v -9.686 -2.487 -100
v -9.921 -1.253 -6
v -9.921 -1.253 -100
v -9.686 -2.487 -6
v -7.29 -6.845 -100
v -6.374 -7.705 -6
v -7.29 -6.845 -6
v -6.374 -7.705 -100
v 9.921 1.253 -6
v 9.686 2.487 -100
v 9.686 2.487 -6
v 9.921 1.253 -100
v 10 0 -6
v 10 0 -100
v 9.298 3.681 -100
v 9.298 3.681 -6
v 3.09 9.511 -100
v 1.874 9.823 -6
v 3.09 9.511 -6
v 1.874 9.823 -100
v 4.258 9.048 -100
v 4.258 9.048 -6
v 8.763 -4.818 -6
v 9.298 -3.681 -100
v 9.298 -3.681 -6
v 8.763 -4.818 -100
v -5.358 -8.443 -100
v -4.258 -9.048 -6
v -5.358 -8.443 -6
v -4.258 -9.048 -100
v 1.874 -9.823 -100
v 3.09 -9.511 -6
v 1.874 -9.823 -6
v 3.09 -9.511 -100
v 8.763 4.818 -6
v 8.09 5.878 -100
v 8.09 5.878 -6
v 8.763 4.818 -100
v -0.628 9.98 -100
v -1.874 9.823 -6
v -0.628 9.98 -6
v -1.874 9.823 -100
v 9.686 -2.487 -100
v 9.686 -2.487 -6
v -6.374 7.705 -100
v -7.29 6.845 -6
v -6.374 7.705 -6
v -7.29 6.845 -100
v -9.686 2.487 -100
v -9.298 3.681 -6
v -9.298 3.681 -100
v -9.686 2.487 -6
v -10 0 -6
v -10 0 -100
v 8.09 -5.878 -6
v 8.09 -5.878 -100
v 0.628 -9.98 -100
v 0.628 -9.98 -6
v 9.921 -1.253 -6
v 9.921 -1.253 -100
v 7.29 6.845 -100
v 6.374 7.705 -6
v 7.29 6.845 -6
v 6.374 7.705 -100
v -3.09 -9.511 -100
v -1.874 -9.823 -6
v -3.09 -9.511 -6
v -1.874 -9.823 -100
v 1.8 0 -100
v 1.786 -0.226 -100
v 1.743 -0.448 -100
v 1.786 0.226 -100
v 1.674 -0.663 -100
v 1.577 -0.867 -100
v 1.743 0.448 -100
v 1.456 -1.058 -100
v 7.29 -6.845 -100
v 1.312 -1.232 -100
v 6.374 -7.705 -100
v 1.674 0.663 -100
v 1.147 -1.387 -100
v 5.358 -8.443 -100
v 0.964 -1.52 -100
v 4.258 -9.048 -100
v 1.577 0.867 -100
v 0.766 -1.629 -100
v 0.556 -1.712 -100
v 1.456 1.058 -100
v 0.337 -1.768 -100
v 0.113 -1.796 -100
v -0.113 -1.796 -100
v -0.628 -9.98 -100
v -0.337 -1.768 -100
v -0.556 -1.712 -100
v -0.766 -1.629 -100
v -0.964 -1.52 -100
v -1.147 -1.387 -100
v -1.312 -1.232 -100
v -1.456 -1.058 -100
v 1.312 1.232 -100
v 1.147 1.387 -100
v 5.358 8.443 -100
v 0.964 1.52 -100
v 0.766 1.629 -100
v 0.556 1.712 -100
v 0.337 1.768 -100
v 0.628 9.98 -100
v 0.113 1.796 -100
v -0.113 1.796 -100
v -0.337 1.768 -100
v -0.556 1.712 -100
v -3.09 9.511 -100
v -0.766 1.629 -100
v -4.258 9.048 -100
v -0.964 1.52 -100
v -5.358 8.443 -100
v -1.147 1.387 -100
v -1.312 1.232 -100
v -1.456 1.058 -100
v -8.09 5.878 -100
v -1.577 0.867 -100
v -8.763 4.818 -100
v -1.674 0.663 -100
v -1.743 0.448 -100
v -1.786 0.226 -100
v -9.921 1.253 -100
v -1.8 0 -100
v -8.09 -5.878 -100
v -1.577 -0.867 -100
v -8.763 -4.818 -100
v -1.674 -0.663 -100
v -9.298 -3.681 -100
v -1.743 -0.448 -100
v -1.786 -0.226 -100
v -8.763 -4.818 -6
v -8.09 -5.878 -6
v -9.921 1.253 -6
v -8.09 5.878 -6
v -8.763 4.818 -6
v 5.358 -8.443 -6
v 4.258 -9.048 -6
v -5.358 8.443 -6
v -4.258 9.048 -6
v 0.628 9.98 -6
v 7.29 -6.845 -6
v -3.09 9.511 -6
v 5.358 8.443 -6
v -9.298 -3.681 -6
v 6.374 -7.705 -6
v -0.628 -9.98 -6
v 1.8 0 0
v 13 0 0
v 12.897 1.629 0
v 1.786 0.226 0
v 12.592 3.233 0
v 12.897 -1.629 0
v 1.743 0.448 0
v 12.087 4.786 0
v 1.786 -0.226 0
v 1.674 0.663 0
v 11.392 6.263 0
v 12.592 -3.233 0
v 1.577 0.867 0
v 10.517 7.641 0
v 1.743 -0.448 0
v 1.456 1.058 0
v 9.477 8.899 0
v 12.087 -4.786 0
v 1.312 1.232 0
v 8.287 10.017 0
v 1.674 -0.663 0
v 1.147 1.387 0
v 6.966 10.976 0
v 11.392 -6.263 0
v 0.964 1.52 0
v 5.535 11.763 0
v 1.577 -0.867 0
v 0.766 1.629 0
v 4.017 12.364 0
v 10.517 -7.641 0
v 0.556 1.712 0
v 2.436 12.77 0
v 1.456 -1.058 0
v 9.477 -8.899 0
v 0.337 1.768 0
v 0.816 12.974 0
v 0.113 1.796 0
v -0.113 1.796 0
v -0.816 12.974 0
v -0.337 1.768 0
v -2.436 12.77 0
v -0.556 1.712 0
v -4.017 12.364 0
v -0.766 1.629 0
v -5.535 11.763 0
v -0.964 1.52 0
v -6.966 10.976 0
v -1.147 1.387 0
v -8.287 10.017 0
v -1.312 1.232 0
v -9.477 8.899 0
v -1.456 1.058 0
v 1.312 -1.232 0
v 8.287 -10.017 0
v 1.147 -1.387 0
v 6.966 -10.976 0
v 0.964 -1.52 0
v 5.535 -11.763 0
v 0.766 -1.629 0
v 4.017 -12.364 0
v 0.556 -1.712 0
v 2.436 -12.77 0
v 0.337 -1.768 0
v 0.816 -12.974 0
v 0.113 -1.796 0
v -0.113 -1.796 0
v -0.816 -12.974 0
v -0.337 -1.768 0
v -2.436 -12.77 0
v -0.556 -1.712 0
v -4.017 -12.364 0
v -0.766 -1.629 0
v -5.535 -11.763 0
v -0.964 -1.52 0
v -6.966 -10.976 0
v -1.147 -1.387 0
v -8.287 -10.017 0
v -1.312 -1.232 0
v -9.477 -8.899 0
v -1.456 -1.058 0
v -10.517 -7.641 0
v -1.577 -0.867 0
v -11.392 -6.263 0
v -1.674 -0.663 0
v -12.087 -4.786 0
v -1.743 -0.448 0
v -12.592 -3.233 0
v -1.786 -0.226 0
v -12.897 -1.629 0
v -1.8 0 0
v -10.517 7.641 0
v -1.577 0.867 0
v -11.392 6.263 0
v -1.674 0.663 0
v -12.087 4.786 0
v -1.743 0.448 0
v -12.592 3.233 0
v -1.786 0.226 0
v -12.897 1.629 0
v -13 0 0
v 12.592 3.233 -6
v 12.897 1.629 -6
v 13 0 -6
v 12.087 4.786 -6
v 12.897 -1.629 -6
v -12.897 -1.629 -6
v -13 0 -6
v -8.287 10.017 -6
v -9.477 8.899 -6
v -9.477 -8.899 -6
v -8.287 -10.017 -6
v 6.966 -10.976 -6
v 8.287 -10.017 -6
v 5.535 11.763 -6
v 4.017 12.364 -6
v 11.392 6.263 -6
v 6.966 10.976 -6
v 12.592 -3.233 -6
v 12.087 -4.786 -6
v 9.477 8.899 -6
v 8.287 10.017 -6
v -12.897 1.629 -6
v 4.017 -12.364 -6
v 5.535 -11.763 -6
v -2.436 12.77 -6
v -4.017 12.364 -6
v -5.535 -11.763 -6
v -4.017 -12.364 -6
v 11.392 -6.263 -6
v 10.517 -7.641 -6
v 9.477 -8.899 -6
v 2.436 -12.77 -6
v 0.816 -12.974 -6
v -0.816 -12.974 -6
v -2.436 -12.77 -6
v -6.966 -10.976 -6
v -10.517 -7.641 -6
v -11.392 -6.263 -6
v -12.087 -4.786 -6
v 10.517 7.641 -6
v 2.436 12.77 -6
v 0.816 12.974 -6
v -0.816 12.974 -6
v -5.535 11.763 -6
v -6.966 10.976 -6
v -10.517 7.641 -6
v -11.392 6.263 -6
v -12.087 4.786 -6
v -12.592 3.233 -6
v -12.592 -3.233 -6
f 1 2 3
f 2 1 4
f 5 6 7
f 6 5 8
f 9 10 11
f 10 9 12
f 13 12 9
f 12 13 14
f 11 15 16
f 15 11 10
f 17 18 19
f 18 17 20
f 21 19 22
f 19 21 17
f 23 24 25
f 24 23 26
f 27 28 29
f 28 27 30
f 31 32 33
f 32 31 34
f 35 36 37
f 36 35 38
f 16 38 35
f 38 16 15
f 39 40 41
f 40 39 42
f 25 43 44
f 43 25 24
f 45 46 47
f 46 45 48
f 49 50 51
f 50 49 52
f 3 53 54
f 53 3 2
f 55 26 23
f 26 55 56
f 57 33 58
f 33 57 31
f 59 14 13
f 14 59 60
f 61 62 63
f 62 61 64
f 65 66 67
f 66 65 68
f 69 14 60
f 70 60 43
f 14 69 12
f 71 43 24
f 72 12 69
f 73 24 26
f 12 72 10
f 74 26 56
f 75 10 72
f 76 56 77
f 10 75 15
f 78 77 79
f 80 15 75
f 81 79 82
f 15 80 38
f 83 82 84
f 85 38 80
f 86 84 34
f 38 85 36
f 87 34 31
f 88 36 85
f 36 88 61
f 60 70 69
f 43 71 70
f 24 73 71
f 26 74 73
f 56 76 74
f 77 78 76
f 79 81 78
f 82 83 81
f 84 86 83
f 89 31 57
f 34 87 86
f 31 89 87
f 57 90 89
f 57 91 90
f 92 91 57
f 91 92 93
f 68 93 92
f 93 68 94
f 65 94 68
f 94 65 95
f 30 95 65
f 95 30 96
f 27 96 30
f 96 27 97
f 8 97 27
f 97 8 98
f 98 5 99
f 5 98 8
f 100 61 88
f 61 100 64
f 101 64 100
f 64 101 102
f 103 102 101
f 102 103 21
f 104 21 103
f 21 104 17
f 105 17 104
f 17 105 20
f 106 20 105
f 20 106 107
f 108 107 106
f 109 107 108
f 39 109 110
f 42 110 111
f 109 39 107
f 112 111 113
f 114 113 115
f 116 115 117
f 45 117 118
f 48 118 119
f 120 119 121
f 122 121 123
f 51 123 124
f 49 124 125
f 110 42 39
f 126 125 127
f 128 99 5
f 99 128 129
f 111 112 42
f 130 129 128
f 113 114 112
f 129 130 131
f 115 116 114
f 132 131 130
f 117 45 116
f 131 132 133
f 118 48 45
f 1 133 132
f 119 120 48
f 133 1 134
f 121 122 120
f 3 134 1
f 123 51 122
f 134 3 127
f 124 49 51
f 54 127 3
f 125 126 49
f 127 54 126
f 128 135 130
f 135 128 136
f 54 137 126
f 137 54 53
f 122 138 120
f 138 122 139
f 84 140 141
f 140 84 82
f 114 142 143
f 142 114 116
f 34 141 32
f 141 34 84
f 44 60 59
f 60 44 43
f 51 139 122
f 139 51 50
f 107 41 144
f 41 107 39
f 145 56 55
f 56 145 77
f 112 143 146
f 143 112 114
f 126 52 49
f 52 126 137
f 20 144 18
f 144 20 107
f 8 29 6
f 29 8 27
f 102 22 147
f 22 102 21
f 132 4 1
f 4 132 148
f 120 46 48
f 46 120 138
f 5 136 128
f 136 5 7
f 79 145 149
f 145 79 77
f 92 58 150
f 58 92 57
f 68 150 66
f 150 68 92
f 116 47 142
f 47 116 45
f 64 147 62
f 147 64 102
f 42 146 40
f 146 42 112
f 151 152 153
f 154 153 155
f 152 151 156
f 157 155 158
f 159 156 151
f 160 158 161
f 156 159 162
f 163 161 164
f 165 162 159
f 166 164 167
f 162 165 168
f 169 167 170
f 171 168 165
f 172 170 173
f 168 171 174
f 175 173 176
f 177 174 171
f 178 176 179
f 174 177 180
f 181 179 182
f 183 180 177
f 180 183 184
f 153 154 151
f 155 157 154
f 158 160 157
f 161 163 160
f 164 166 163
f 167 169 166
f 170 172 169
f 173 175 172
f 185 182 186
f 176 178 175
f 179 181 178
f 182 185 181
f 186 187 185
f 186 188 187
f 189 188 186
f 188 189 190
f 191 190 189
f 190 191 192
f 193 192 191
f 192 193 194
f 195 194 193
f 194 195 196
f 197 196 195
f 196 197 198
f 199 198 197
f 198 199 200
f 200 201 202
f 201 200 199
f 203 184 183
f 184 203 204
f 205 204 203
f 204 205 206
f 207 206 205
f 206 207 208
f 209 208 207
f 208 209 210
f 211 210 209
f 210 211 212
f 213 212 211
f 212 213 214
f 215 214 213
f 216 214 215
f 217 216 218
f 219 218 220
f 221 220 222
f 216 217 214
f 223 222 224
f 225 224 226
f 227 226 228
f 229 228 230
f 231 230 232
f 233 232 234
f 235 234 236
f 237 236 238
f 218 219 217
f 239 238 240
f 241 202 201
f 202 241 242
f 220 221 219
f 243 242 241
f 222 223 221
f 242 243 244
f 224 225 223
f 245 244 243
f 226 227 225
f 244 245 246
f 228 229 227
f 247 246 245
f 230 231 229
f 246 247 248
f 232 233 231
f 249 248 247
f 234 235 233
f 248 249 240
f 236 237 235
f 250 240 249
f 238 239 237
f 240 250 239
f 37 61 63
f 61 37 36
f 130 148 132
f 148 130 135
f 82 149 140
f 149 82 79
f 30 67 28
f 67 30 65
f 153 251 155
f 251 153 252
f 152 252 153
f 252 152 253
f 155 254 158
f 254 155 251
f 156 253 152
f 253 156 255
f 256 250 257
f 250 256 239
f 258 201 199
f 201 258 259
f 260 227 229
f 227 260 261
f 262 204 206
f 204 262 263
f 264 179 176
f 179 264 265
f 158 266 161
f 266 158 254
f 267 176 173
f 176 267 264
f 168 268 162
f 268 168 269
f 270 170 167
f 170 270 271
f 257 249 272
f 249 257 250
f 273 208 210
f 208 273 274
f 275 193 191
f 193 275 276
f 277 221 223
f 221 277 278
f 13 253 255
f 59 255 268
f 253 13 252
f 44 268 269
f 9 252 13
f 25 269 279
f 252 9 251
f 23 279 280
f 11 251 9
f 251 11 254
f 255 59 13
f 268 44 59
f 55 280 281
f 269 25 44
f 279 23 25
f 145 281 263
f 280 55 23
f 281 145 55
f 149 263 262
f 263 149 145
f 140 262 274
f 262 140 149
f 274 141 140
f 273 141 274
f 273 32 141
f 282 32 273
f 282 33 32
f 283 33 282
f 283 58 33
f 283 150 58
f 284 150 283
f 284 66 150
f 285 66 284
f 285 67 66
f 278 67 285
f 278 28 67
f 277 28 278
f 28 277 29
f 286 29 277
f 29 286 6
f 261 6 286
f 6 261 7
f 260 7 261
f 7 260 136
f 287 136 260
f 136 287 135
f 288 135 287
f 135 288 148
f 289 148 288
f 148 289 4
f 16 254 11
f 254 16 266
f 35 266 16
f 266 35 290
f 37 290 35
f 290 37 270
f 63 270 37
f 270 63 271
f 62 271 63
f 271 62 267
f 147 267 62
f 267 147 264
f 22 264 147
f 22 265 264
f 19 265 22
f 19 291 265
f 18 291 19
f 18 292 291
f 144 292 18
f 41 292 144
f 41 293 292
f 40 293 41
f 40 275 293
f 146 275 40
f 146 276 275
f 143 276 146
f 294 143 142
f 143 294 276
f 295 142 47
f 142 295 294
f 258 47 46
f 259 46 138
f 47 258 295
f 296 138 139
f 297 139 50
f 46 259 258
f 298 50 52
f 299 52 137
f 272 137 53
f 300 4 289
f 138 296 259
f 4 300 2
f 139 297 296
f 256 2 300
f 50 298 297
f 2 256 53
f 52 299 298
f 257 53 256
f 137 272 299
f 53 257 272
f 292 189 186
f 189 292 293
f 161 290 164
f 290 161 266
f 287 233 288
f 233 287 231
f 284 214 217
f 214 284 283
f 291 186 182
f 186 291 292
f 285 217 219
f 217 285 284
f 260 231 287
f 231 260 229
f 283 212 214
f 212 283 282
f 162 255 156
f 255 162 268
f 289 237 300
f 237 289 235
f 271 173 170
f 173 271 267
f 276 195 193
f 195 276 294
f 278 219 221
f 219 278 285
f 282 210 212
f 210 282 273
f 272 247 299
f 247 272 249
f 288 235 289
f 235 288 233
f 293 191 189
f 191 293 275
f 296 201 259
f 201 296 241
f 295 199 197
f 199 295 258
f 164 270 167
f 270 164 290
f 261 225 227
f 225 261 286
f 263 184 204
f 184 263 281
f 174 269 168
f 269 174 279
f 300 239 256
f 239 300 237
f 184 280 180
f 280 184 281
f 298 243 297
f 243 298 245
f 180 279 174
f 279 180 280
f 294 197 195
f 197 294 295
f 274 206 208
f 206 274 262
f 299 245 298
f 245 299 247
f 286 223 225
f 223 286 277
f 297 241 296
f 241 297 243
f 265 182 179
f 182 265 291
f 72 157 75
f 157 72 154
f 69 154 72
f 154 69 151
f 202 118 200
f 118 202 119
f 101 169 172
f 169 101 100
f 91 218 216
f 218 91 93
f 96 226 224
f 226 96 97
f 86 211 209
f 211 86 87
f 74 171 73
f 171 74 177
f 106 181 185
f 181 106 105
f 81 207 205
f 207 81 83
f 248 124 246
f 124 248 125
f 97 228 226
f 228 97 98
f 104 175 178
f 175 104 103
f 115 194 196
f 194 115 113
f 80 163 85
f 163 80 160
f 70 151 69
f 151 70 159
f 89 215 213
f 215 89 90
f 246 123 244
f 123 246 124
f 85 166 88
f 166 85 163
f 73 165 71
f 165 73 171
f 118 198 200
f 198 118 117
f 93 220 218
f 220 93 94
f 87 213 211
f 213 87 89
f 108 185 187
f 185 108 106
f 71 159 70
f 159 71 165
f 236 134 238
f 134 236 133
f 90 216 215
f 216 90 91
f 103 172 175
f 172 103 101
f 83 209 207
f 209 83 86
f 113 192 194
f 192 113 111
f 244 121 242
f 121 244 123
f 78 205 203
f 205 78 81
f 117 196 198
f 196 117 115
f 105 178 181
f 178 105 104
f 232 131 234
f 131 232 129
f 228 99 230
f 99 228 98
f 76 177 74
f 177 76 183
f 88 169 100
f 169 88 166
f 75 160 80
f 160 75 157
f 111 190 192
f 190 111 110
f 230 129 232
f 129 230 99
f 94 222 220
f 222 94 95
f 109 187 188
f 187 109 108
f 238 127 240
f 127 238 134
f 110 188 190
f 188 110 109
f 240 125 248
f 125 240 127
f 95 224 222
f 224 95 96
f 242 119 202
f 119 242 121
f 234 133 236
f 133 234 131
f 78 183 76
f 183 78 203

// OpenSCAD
$fn = 50;


difference() {
	union() {
		translate(v = [0, 0, -100.0000000000]) {
			cylinder(h = 100, r = 10.0000000000);
		}
		translate(v = [0, 0, -6.0000000000]) {
			cylinder(h = 6, r = 13.0000000000);
		}
	}
	union() {
		#translate(v = [0, 0, -100]) {
			cylinder(h = 100, r = 1.8000000000);
		}
	}
}
